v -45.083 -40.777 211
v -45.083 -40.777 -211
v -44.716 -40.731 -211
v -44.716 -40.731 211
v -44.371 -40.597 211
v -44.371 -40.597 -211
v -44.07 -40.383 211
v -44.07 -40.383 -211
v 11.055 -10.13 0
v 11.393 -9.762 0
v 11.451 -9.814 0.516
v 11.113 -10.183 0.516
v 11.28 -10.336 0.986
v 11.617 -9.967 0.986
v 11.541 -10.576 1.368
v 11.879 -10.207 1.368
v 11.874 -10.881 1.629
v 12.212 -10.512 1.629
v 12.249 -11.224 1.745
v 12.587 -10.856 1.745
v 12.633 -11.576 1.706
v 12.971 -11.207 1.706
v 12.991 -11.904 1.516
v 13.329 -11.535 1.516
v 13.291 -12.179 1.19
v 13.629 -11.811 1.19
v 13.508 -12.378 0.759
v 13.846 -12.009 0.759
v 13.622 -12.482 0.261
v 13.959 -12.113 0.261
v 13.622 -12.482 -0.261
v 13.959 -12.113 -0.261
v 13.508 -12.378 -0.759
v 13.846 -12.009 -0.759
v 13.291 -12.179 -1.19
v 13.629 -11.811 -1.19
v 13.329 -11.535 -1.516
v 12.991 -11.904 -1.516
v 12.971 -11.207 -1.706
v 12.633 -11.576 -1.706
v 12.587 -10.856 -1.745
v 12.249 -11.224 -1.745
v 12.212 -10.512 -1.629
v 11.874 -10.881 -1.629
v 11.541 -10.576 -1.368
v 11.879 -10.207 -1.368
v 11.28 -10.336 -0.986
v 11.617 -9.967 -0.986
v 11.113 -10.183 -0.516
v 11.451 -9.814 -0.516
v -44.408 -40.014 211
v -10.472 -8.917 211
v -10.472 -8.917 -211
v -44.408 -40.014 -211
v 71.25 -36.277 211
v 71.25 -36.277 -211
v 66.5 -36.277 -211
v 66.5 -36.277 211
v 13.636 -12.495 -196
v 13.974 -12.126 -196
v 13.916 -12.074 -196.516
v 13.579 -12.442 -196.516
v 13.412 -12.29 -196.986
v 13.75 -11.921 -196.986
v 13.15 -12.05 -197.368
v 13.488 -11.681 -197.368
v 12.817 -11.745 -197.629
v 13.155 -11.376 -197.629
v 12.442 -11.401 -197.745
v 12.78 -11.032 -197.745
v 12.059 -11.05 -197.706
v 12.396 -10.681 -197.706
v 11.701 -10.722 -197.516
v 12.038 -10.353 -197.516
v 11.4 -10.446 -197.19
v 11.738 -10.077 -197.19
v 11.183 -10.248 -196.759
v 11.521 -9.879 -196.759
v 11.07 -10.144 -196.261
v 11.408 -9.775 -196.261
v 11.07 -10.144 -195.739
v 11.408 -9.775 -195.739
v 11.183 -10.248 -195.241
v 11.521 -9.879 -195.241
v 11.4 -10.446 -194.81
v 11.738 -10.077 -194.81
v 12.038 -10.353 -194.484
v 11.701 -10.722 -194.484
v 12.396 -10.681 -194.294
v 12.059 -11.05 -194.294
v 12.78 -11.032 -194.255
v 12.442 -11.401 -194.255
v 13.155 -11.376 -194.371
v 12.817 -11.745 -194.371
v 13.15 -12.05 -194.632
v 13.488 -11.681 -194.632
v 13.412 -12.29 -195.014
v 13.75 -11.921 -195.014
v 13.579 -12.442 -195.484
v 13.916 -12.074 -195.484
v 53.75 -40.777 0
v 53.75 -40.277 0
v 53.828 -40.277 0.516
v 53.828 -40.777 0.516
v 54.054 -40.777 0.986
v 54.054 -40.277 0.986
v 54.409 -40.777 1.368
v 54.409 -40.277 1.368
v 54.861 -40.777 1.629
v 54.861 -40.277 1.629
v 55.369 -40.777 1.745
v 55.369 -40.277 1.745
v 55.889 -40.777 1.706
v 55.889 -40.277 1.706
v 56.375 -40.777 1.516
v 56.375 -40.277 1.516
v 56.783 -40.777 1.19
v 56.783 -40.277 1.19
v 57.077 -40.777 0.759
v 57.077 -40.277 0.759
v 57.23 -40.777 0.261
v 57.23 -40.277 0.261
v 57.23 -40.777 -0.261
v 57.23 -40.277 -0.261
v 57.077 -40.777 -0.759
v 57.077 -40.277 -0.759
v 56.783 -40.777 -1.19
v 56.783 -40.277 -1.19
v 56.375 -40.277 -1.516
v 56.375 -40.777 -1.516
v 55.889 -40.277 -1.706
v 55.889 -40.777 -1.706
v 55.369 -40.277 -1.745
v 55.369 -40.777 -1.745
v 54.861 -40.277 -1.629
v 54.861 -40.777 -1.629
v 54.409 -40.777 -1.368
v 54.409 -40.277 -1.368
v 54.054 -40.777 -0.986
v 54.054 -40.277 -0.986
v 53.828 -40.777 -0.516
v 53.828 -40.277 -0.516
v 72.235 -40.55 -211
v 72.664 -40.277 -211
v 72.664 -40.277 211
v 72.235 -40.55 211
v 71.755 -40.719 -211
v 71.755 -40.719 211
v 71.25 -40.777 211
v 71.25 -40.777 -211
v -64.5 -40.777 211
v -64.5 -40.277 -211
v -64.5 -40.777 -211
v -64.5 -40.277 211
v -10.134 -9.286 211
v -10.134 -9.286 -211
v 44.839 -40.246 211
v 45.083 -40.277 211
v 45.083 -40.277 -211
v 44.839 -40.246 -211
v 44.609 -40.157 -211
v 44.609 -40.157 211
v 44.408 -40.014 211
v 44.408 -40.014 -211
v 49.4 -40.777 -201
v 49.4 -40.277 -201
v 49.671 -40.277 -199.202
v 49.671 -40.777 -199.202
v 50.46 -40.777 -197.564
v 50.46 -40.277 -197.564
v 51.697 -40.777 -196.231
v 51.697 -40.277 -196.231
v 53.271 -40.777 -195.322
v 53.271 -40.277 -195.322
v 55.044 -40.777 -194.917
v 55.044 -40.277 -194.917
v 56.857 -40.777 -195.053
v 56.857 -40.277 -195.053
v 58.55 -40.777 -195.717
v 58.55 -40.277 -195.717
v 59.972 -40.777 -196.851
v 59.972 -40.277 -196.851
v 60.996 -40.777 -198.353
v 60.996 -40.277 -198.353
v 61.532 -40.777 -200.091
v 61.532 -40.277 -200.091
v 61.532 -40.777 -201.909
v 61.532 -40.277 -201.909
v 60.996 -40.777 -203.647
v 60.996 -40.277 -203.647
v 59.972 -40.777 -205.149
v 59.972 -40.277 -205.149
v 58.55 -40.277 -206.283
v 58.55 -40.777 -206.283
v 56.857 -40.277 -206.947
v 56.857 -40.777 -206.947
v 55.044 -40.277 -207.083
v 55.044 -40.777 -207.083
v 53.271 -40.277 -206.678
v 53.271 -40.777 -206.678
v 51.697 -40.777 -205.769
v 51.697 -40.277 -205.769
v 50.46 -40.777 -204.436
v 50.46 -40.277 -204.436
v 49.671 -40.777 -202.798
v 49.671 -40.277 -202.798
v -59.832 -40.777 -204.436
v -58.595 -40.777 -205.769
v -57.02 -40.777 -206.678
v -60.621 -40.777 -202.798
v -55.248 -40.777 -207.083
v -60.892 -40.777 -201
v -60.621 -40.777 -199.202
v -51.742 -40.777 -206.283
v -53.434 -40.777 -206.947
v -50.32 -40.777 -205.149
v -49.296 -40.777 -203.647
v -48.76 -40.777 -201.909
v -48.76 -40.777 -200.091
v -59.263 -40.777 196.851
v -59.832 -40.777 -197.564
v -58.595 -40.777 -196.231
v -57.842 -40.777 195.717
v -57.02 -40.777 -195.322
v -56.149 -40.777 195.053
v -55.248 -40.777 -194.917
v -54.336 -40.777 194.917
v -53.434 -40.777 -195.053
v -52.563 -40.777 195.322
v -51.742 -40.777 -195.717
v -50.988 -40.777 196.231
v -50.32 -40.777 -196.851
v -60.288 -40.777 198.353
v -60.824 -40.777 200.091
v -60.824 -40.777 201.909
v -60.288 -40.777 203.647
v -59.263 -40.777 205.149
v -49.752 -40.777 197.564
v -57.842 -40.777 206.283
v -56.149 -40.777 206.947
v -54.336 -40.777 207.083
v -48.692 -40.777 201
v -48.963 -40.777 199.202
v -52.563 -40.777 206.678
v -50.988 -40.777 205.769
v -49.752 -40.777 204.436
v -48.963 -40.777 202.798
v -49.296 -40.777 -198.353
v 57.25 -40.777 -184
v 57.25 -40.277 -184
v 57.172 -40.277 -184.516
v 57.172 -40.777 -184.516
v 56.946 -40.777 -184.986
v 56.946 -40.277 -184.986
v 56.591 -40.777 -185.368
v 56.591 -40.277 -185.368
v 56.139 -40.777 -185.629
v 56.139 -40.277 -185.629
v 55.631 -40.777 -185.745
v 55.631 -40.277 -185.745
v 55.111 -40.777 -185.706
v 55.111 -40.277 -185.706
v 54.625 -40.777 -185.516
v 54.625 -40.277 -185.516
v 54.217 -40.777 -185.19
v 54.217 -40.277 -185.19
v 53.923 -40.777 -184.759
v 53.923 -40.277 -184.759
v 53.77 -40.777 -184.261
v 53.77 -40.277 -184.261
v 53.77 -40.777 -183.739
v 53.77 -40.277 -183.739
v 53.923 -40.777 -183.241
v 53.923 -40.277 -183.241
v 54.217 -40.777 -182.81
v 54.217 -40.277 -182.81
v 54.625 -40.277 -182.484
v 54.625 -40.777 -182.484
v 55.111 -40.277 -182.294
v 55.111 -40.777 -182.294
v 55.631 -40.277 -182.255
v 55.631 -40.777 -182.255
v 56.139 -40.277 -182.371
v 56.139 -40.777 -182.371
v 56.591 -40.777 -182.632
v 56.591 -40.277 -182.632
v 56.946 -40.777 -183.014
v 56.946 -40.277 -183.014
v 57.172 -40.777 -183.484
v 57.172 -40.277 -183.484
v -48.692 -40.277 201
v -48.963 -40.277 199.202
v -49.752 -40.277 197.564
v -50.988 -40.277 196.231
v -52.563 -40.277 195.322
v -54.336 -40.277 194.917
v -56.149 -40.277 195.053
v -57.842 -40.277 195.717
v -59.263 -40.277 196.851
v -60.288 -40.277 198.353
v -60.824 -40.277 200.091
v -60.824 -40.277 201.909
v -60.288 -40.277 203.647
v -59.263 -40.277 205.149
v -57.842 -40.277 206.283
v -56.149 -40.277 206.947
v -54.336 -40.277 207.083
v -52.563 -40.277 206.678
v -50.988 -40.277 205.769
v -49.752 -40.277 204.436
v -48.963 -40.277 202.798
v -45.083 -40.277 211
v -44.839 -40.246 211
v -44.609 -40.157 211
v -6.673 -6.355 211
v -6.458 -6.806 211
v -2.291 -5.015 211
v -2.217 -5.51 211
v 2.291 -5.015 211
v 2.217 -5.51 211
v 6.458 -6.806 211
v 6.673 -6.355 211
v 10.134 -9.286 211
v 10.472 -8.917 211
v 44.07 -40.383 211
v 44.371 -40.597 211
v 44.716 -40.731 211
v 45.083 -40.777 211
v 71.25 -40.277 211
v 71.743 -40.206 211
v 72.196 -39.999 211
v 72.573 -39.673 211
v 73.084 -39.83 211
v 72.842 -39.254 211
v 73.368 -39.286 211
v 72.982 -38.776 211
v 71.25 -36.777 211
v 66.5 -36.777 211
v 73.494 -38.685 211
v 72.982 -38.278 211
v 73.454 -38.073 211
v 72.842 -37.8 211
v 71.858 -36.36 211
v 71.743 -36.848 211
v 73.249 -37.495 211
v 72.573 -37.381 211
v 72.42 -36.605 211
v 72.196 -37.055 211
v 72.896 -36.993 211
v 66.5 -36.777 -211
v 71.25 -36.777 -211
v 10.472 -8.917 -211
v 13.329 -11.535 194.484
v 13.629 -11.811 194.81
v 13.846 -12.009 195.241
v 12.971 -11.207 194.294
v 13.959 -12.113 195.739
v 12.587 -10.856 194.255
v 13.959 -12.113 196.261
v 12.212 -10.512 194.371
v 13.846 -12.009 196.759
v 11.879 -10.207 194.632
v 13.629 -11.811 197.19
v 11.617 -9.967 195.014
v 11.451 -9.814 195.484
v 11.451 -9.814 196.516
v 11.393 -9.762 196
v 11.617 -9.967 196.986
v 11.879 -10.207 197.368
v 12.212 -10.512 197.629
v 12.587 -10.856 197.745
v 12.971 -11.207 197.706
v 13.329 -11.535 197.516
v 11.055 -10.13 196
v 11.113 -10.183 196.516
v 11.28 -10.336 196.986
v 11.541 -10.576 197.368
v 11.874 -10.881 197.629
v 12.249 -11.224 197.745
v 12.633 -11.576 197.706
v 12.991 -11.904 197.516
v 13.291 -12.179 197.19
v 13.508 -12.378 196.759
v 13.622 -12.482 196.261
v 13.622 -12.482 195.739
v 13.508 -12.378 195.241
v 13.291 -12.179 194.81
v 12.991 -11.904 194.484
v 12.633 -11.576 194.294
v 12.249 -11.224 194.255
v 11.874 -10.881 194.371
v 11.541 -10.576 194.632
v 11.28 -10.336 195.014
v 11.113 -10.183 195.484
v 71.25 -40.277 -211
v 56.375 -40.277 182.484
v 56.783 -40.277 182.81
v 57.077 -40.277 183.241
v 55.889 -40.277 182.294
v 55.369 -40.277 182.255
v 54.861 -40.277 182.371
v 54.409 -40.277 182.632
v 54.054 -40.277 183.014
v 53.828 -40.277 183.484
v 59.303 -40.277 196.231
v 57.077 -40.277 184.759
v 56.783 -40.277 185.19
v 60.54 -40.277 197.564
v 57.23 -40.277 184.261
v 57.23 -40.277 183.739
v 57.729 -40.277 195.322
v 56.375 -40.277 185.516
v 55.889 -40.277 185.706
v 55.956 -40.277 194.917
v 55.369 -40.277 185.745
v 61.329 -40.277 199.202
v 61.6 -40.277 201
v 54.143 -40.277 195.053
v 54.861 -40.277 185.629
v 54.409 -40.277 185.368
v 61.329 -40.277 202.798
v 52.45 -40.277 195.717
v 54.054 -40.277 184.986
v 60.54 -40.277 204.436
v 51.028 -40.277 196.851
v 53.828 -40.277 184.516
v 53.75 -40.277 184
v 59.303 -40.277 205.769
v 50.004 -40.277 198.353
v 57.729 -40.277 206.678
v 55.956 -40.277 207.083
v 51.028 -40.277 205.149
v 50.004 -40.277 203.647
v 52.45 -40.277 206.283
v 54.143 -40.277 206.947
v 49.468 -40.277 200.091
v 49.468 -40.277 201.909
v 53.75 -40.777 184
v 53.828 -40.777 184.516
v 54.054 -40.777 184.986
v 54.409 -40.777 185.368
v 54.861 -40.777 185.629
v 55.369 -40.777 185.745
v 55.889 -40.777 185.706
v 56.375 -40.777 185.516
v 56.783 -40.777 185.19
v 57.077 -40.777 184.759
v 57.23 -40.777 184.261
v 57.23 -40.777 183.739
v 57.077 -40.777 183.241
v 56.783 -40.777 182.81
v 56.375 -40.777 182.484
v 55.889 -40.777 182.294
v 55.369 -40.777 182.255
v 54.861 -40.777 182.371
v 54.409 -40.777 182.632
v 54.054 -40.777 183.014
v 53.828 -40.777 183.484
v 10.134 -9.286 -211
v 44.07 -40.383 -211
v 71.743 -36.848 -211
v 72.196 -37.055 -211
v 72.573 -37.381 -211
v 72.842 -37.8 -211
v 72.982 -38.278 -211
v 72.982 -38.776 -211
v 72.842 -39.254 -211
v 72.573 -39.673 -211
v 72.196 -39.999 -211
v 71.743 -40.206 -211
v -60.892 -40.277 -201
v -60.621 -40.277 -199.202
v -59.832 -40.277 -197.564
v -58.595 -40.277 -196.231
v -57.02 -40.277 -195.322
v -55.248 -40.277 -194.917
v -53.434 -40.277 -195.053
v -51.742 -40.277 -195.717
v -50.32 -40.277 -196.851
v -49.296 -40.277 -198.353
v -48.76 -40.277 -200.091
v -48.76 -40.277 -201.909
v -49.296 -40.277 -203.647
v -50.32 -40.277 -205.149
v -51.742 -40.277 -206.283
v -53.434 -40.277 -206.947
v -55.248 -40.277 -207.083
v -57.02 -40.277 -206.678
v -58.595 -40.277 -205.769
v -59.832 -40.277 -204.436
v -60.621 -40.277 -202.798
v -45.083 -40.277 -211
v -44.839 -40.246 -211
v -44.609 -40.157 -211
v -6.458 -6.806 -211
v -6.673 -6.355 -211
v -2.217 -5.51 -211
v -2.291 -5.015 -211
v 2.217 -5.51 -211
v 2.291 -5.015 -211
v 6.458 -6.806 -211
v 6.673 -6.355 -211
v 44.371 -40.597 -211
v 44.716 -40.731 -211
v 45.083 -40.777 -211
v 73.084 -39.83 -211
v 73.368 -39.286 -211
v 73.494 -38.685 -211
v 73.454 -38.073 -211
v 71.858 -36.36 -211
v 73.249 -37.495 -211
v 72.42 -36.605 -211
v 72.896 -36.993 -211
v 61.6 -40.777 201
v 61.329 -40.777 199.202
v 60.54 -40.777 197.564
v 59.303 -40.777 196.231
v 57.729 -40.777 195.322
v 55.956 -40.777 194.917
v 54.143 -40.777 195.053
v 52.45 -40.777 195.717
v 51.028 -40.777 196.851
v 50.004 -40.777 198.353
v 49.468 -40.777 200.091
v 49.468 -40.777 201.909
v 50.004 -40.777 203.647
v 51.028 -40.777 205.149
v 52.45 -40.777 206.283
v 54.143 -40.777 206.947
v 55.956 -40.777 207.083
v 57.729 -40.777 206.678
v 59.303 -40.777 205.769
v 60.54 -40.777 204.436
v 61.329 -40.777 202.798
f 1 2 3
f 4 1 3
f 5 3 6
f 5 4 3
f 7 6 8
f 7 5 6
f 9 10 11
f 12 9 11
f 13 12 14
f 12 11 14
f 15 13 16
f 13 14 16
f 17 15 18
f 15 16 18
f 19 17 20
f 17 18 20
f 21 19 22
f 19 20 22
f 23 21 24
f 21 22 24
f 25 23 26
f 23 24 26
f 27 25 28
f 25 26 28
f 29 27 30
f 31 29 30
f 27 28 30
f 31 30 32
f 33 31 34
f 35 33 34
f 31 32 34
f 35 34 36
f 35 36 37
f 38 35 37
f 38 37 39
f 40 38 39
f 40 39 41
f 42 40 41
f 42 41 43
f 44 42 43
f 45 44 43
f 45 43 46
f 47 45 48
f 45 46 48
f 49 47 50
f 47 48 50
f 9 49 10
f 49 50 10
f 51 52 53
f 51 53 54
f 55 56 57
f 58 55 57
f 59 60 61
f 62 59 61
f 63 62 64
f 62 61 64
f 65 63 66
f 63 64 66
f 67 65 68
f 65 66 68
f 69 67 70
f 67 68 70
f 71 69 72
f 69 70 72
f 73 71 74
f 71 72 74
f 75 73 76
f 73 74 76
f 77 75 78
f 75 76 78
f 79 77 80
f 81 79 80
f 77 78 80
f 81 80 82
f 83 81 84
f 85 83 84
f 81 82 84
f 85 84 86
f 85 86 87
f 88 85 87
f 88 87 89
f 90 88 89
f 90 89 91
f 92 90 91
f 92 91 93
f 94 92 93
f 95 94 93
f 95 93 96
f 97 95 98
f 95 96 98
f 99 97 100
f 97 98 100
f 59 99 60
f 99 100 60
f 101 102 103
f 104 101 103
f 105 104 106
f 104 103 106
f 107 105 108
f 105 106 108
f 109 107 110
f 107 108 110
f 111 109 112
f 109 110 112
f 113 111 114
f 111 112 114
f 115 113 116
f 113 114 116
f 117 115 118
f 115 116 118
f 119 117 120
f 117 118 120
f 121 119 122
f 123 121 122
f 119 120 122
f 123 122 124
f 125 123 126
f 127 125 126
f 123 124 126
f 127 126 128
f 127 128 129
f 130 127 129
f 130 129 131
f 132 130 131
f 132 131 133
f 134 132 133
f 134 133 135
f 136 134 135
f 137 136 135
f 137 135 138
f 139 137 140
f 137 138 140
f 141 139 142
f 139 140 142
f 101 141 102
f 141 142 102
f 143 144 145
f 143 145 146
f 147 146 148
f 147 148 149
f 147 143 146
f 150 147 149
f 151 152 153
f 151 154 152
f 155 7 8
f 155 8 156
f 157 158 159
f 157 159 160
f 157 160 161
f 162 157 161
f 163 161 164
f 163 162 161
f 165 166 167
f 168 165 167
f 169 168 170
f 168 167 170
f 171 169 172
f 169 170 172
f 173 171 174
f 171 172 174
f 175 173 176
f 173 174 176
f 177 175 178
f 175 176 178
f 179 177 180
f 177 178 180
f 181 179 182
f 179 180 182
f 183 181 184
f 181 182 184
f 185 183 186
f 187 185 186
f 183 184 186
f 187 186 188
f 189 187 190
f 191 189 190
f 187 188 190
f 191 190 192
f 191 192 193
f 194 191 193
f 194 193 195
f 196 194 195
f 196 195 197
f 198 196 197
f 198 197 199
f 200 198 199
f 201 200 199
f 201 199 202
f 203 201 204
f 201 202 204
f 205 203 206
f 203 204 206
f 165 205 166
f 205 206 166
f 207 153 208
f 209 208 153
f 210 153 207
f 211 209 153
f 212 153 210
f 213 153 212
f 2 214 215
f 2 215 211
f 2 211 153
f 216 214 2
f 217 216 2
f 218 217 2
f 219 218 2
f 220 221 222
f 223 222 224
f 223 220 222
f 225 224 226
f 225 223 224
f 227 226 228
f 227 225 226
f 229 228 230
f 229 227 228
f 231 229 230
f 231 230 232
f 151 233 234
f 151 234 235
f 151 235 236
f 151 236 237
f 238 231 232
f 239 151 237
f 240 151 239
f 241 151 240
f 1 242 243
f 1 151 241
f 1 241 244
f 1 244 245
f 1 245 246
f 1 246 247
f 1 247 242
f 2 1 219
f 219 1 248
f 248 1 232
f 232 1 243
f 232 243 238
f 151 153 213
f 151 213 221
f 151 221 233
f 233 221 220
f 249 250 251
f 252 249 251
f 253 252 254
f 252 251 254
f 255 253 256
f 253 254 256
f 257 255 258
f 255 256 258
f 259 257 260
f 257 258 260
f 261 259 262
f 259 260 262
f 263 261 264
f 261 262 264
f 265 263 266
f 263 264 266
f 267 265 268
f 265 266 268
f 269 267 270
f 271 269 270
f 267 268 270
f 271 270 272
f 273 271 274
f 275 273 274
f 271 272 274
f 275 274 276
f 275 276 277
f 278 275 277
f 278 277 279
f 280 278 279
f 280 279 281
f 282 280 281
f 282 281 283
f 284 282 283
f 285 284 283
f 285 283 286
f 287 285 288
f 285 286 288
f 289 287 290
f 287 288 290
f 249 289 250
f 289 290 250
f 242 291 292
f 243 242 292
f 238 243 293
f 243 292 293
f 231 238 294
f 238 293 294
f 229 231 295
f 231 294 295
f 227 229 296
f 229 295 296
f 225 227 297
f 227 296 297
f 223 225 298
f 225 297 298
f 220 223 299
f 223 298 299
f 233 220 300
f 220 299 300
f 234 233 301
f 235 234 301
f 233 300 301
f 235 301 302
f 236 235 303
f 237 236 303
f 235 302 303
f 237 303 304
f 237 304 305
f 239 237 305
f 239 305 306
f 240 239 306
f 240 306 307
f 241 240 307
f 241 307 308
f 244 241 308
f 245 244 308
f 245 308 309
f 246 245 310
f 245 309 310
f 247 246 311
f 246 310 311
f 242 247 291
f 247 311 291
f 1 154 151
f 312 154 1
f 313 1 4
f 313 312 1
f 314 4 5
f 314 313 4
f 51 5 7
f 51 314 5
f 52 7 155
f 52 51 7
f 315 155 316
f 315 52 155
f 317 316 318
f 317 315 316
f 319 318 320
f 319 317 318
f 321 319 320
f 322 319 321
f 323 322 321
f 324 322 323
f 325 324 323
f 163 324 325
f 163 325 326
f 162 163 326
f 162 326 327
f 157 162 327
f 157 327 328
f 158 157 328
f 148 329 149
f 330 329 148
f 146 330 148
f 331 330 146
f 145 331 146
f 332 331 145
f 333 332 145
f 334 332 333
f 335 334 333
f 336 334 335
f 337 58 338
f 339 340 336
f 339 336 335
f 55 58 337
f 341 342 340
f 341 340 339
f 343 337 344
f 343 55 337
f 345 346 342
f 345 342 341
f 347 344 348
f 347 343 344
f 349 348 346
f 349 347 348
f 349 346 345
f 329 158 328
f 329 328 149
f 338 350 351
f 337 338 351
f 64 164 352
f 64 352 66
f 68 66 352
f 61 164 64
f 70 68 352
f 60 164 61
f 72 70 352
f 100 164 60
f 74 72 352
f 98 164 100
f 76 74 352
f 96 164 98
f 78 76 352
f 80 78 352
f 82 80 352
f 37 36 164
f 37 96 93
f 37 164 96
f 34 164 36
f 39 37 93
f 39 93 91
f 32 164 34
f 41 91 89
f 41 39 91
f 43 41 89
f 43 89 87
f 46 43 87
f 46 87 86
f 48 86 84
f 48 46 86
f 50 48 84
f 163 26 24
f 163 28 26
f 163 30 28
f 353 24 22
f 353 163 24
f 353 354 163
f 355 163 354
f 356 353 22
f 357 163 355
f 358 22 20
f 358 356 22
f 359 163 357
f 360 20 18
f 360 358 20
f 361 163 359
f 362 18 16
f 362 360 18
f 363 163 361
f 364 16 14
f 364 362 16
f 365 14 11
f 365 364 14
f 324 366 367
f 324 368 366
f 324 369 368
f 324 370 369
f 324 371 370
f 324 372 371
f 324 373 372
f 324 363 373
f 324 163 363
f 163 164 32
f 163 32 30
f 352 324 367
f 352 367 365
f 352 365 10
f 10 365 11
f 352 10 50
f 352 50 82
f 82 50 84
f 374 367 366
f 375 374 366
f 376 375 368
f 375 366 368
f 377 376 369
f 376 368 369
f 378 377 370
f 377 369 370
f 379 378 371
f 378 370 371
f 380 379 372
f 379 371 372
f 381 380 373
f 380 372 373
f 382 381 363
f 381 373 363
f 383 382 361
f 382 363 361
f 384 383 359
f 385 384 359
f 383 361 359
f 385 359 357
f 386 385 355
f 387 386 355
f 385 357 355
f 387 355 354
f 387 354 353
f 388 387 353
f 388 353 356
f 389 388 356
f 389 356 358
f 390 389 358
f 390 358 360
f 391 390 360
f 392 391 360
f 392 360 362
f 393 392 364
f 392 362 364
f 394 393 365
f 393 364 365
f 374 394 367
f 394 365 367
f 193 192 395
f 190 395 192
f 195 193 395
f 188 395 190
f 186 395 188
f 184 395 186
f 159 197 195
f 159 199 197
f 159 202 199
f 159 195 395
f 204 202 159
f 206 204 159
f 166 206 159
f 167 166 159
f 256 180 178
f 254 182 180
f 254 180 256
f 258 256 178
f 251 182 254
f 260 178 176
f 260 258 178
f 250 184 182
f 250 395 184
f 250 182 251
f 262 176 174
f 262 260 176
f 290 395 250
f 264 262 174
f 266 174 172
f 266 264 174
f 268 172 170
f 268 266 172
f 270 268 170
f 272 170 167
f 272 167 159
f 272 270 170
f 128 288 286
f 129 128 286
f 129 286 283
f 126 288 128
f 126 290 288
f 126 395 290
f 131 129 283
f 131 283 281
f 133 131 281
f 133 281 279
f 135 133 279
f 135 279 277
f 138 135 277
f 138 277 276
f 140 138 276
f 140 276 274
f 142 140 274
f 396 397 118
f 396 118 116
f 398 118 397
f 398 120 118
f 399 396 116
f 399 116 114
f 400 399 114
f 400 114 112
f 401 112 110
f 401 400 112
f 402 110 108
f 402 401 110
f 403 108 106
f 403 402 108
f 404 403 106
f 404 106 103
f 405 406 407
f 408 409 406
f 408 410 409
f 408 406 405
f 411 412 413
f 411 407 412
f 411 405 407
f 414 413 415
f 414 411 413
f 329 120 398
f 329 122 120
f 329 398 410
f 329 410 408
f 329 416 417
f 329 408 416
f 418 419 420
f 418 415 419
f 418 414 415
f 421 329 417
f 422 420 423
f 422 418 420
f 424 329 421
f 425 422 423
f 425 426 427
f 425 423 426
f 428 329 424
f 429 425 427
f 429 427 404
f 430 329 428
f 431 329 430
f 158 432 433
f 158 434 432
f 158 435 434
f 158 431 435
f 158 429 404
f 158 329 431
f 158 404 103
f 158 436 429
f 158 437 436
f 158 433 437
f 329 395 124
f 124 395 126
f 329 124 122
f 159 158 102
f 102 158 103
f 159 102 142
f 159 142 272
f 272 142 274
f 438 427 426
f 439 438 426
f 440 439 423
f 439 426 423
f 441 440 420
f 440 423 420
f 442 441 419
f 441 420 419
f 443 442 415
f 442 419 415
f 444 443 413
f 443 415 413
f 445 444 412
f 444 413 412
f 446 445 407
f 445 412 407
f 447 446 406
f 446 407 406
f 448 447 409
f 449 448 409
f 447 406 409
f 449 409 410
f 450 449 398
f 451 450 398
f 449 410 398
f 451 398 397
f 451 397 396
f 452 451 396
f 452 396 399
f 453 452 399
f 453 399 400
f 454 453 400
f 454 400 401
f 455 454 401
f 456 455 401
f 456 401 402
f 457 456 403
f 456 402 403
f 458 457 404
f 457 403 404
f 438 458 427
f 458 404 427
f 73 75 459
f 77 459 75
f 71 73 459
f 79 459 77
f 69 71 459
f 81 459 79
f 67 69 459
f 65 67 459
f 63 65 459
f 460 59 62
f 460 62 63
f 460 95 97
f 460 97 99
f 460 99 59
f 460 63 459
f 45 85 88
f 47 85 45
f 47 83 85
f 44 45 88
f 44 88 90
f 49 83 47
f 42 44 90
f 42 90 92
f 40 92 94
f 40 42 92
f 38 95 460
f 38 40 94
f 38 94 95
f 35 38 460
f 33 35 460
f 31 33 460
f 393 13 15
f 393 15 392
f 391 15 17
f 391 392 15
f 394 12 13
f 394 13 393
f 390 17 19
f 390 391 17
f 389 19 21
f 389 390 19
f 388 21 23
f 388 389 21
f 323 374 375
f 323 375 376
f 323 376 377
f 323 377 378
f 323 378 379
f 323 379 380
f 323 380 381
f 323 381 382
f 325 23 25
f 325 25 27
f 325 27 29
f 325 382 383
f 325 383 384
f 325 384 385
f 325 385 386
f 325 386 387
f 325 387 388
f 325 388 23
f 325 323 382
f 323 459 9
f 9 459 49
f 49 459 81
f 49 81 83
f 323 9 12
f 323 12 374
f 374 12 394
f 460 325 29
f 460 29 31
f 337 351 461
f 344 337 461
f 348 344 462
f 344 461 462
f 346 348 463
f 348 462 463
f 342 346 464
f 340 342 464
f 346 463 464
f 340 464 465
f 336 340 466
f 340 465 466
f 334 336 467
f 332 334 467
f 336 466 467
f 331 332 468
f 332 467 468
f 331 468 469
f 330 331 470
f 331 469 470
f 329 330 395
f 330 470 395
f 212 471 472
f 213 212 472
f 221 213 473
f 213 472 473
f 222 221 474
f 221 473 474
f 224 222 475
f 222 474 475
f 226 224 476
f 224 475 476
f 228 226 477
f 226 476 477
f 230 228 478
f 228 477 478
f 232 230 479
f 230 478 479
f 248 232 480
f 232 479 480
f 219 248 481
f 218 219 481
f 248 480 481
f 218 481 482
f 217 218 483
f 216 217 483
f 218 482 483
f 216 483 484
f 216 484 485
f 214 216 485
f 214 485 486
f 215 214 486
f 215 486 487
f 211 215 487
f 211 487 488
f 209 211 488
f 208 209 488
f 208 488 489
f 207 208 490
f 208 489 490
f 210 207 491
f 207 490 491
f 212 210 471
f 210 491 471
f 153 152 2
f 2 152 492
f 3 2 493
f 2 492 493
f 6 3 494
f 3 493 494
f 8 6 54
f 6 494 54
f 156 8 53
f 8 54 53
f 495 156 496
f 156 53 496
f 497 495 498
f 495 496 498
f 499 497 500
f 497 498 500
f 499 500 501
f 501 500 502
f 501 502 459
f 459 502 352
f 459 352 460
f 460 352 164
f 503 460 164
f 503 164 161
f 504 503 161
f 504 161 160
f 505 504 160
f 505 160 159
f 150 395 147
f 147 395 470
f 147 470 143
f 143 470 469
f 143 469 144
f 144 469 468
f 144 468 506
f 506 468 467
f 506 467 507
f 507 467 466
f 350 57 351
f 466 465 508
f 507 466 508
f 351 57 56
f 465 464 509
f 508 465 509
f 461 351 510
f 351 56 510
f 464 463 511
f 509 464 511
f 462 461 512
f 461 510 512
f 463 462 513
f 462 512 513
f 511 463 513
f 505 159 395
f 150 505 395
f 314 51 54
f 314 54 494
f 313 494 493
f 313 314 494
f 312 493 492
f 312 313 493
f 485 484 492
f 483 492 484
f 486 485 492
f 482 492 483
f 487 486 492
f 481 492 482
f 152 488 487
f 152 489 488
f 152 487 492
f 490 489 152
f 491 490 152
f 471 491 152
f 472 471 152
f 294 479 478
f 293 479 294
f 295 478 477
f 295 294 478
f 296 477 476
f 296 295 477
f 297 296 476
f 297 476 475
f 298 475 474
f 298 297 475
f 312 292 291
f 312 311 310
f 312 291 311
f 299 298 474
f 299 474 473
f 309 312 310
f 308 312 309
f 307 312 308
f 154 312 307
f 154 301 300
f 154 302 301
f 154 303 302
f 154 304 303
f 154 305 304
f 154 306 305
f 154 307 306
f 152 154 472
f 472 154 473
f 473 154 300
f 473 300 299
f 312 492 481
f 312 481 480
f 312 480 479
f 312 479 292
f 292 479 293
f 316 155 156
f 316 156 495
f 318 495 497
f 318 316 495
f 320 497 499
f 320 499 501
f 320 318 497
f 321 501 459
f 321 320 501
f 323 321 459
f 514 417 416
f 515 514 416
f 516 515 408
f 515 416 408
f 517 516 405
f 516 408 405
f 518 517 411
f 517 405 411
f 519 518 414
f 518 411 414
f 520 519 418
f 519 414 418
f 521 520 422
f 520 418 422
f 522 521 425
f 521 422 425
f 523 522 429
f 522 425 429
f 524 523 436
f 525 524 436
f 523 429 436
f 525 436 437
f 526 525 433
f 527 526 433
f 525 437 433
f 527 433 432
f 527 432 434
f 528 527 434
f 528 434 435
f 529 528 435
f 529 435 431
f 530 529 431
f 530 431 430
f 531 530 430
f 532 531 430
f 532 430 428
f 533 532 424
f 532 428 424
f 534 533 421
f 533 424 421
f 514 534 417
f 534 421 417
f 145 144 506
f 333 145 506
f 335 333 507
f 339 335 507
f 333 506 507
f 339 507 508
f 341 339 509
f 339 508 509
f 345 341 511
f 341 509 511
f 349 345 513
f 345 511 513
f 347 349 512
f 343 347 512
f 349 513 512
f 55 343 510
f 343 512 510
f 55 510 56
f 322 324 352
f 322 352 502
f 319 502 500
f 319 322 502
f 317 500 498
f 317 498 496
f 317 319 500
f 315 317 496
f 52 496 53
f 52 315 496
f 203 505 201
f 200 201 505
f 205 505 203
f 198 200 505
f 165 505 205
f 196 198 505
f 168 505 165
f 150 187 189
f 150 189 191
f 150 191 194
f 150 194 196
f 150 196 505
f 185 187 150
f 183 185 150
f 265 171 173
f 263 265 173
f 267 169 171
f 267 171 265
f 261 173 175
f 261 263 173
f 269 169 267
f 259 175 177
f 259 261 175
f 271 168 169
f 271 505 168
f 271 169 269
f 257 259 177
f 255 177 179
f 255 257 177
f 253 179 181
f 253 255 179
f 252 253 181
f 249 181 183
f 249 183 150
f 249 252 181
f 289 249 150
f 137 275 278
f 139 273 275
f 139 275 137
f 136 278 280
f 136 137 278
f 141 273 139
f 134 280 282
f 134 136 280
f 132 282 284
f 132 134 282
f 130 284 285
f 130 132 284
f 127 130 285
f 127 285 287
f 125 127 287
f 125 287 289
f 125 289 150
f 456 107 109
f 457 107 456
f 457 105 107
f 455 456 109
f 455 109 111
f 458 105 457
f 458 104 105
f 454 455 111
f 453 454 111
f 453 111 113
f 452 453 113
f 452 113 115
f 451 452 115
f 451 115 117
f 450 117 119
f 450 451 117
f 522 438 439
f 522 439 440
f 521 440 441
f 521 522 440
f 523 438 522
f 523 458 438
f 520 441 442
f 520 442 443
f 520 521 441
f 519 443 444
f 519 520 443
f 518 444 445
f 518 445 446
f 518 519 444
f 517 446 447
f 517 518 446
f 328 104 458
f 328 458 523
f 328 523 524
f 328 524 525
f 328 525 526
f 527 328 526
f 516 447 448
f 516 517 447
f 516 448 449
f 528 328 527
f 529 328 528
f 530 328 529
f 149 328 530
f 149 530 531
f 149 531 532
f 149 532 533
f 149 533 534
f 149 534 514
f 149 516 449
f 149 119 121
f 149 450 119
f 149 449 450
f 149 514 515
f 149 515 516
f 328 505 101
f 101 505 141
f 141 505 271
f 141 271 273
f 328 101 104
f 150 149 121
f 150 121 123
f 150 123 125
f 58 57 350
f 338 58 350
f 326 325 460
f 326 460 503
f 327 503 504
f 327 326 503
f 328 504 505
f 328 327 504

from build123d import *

# Parameters (mm, degrees)
BASE_FLANGE1_DEPTH = 211
SKETCH13_R         = 6.1
EXTRUDE1_DEPTH     = 0.5
SKETCH16_R         = 1.75
EXTRUDE2_DEPTH     = 0.5
SKETCH17_R         = 1.75
EXTRUDE3_DEPTH     = 0.5
SKETCH18_R         = 1.75
EXTRUDE4_DEPTH     = 0.5
HEM1_START         = -211
HEM1_DEPTH         = 422
HEM1_2_DEPTH       = 422


# Read off the part's stored shape, not the designer's step: Hem1
# Sheet-metal steps are written as plain solids
with BuildPart() as part:
    # Sketch1 → Base-Flange1 (new, symmetric)
    with BuildSketch(Plane.XY):
        with BuildLine():
            Line((-64.5, -40.776737244), (-45.083318098, -40.776737244))
            ThreePointArc((-45.083318098, -40.776737244), (-44.53966104, -40.674749048), (-44.069932786, -40.382653249))
            Line((-44.069932786, -40.382653249), (-10.133853114, -9.285965521))
            ThreePointArc((-10.133853114, -9.285965521), (0, -5.345125574), (10.133853114, -9.285965521))
            Line((10.133853114, -9.285965521), (44.069932786, -40.382653249))
            ThreePointArc((44.069932786, -40.382653249), (44.53966104, -40.674749048), (45.083318098, -40.776737244))
            Line((45.083318098, -40.776737244), (73.5, -40.776737244))
            Line((73.5, -40.776737244), (73.5, -40.276737244))
            Line((73.5, -40.276737244), (45.083318098, -40.276737244))
            ThreePointArc((45.083318098, -40.276737244), (44.720880059, -40.208745113), (44.40772789, -40.014014581))
            Line((44.40772789, -40.014014581), (10.471648218, -8.917326853))
            ThreePointArc((10.471648218, -8.917326853), (0, -4.845125574), (-10.471648218, -8.917326853))
            Line((-10.471648218, -8.917326853), (-44.40772789, -40.014014581))
            ThreePointArc((-44.40772789, -40.014014581), (-44.720880059, -40.208745113), (-45.083318098, -40.276737244))
            Line((-45.083318098, -40.276737244), (-64.5, -40.276737244))
            Line((-64.5, -40.276737244), (-64.5, -40.776737244))
        make_face()
    extrude(amount=BASE_FLANGE1_DEPTH, both=True)

    # Sketch13 → Extrude1 (cut)
    with BuildSketch(Plane(origin=(0, -40.276737244, 0), x_dir=(1, 0, 0), z_dir=(0, 1, 0))):
        with Locations(Location((-54.791659049, 201, 0), (0, 0, 180))):
            Circle(SKETCH13_R)
        with Locations(Location((55.5, 201, 0), (0, 0, 180))):
            Circle(SKETCH13_R)
        with Locations((55.5, -201)):
            Circle(SKETCH13_R)
        with Locations((-54.791659049, -201)):
            Circle(SKETCH13_R)
    extrude(amount=-EXTRUDE1_DEPTH, mode=Mode.SUBTRACT)

    # Sketch16 → Extrude2 (cut)
    with BuildSketch(Plane(origin=(0.337795104, 0.368638668, 0), x_dir=(0, 0, -1), z_dir=(0.6755902076156584, 0.7372773368101257, 0))):
        with Locations(Location((-196, -16.74496761, 0), (0, 0, 90))):
            Circle(SKETCH16_R)
        with Locations(Location((196, -16.74496761, 0), (0, 0, 270))):
            Circle(SKETCH16_R)
        with Locations(Location((0, -16.74496761, 0), (0, 0, 90))):
            Circle(SKETCH16_R)
    extrude(amount=-EXTRUDE2_DEPTH, mode=Mode.SUBTRACT)

    # Sketch17 → Extrude3 (cut)
    with BuildSketch(Plane(origin=(0, -40.276737244, 0), x_dir=(1, 0, 0), z_dir=(0, 1, 0))):
        with Locations(Location((55.5, 0, 0), (0, 0, 180))):
            Circle(SKETCH17_R)
    extrude(amount=-EXTRUDE3_DEPTH, mode=Mode.SUBTRACT)

    # Sketch18 → Extrude4 (cut)
    with BuildSketch(Plane(origin=(0, -40.276737244, 0), x_dir=(1, 0, 0), z_dir=(0, 1, 0))):
        with Locations(Location((55.5, -184, 0), (0, 0, 180))):
            Circle(SKETCH18_R)
        with Locations((55.5, 184)):
            Circle(SKETCH18_R)
    extrude(amount=-EXTRUDE4_DEPTH, mode=Mode.SUBTRACT)

    # Hem1 outline → Hem1 (cut)
    with BuildSketch(Plane.XY.offset(HEM1_START)):
        with BuildLine():
            Line((73.5, -40.276737244), (72.664213562, -40.276737244))
            ThreePointArc((72.664213562, -40.276737244), (72, -40.648057588), (71.25, -40.776737244))
            Line((71.25, -40.776737244), (73.5, -40.776737244))
            Line((73.5, -40.776737244), (73.5, -40.276737244))
        make_face()
    extrude(amount=HEM1_DEPTH, mode=Mode.SUBTRACT)

    # Hem1 2 outline → Hem1 2 (add)
    with BuildSketch(Plane.XY.offset(HEM1_START)):
        with BuildLine():
            Line((66.5, -36.276737244), (66.5, -36.776737244))
            Line((66.5, -36.776737244), (71.25, -36.776737244))
            ThreePointArc((71.25, -36.776737244), (73, -38.526737244), (71.25, -40.276737244))
            Line((71.25, -40.276737244), (72.664213562, -40.276737244))
            ThreePointArc((72.664213562, -40.276737244), (73.371320344, -37.776737244), (71.25, -36.276737244))
            Line((71.25, -36.276737244), (66.5, -36.276737244))
        make_face()
    extrude(amount=HEM1_2_DEPTH)


solid = part.part
